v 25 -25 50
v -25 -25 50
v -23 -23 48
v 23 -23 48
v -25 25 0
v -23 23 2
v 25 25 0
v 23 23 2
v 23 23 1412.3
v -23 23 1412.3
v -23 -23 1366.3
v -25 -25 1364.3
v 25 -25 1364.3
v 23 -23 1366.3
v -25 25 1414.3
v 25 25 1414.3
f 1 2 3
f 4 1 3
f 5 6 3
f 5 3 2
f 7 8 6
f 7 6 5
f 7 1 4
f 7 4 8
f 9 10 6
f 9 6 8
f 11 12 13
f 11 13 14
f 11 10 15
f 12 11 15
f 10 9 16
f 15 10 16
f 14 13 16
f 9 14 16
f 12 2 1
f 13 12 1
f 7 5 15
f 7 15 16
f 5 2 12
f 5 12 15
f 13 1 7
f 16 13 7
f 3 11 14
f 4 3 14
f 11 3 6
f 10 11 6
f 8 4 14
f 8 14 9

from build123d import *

# Parameters (mm, degrees)
SKETCH1_W           = 50
SKETCH1_H           = 50
SKETCH1_W_2         = 46
SKETCH1_H_2         = 46
BOSS_EXTRUDE1_DEPTH = 1414.3
CUT_EXTRUDE1_DEPTH  = 1416.404355652


with BuildPart() as part:
    # Sketch1 → Boss-Extrude1 (new body)
    with BuildSketch(Plane.XY):
        Rectangle(SKETCH1_W, SKETCH1_H)
        Rectangle(SKETCH1_W_2, SKETCH1_H_2, mode=Mode.SUBTRACT)
    extrude(amount=BOSS_EXTRUDE1_DEPTH)

    # Sketch2 → Cut-Extrude1 (cut, through all)
    with BuildSketch(Plane(origin=(25, 0, 0), x_dir=(0, 0, -1), z_dir=(1, 0, 0))):
        Polygon((-1414.3, 25), (-1414.3, -25), (-1364.3, -25), align=None)
        Polygon((0, 25), (0, -25), (-50, -25), align=None)
    extrude(amount=-CUT_EXTRUDE1_DEPTH, mode=Mode.SUBTRACT)


solid = part.part
